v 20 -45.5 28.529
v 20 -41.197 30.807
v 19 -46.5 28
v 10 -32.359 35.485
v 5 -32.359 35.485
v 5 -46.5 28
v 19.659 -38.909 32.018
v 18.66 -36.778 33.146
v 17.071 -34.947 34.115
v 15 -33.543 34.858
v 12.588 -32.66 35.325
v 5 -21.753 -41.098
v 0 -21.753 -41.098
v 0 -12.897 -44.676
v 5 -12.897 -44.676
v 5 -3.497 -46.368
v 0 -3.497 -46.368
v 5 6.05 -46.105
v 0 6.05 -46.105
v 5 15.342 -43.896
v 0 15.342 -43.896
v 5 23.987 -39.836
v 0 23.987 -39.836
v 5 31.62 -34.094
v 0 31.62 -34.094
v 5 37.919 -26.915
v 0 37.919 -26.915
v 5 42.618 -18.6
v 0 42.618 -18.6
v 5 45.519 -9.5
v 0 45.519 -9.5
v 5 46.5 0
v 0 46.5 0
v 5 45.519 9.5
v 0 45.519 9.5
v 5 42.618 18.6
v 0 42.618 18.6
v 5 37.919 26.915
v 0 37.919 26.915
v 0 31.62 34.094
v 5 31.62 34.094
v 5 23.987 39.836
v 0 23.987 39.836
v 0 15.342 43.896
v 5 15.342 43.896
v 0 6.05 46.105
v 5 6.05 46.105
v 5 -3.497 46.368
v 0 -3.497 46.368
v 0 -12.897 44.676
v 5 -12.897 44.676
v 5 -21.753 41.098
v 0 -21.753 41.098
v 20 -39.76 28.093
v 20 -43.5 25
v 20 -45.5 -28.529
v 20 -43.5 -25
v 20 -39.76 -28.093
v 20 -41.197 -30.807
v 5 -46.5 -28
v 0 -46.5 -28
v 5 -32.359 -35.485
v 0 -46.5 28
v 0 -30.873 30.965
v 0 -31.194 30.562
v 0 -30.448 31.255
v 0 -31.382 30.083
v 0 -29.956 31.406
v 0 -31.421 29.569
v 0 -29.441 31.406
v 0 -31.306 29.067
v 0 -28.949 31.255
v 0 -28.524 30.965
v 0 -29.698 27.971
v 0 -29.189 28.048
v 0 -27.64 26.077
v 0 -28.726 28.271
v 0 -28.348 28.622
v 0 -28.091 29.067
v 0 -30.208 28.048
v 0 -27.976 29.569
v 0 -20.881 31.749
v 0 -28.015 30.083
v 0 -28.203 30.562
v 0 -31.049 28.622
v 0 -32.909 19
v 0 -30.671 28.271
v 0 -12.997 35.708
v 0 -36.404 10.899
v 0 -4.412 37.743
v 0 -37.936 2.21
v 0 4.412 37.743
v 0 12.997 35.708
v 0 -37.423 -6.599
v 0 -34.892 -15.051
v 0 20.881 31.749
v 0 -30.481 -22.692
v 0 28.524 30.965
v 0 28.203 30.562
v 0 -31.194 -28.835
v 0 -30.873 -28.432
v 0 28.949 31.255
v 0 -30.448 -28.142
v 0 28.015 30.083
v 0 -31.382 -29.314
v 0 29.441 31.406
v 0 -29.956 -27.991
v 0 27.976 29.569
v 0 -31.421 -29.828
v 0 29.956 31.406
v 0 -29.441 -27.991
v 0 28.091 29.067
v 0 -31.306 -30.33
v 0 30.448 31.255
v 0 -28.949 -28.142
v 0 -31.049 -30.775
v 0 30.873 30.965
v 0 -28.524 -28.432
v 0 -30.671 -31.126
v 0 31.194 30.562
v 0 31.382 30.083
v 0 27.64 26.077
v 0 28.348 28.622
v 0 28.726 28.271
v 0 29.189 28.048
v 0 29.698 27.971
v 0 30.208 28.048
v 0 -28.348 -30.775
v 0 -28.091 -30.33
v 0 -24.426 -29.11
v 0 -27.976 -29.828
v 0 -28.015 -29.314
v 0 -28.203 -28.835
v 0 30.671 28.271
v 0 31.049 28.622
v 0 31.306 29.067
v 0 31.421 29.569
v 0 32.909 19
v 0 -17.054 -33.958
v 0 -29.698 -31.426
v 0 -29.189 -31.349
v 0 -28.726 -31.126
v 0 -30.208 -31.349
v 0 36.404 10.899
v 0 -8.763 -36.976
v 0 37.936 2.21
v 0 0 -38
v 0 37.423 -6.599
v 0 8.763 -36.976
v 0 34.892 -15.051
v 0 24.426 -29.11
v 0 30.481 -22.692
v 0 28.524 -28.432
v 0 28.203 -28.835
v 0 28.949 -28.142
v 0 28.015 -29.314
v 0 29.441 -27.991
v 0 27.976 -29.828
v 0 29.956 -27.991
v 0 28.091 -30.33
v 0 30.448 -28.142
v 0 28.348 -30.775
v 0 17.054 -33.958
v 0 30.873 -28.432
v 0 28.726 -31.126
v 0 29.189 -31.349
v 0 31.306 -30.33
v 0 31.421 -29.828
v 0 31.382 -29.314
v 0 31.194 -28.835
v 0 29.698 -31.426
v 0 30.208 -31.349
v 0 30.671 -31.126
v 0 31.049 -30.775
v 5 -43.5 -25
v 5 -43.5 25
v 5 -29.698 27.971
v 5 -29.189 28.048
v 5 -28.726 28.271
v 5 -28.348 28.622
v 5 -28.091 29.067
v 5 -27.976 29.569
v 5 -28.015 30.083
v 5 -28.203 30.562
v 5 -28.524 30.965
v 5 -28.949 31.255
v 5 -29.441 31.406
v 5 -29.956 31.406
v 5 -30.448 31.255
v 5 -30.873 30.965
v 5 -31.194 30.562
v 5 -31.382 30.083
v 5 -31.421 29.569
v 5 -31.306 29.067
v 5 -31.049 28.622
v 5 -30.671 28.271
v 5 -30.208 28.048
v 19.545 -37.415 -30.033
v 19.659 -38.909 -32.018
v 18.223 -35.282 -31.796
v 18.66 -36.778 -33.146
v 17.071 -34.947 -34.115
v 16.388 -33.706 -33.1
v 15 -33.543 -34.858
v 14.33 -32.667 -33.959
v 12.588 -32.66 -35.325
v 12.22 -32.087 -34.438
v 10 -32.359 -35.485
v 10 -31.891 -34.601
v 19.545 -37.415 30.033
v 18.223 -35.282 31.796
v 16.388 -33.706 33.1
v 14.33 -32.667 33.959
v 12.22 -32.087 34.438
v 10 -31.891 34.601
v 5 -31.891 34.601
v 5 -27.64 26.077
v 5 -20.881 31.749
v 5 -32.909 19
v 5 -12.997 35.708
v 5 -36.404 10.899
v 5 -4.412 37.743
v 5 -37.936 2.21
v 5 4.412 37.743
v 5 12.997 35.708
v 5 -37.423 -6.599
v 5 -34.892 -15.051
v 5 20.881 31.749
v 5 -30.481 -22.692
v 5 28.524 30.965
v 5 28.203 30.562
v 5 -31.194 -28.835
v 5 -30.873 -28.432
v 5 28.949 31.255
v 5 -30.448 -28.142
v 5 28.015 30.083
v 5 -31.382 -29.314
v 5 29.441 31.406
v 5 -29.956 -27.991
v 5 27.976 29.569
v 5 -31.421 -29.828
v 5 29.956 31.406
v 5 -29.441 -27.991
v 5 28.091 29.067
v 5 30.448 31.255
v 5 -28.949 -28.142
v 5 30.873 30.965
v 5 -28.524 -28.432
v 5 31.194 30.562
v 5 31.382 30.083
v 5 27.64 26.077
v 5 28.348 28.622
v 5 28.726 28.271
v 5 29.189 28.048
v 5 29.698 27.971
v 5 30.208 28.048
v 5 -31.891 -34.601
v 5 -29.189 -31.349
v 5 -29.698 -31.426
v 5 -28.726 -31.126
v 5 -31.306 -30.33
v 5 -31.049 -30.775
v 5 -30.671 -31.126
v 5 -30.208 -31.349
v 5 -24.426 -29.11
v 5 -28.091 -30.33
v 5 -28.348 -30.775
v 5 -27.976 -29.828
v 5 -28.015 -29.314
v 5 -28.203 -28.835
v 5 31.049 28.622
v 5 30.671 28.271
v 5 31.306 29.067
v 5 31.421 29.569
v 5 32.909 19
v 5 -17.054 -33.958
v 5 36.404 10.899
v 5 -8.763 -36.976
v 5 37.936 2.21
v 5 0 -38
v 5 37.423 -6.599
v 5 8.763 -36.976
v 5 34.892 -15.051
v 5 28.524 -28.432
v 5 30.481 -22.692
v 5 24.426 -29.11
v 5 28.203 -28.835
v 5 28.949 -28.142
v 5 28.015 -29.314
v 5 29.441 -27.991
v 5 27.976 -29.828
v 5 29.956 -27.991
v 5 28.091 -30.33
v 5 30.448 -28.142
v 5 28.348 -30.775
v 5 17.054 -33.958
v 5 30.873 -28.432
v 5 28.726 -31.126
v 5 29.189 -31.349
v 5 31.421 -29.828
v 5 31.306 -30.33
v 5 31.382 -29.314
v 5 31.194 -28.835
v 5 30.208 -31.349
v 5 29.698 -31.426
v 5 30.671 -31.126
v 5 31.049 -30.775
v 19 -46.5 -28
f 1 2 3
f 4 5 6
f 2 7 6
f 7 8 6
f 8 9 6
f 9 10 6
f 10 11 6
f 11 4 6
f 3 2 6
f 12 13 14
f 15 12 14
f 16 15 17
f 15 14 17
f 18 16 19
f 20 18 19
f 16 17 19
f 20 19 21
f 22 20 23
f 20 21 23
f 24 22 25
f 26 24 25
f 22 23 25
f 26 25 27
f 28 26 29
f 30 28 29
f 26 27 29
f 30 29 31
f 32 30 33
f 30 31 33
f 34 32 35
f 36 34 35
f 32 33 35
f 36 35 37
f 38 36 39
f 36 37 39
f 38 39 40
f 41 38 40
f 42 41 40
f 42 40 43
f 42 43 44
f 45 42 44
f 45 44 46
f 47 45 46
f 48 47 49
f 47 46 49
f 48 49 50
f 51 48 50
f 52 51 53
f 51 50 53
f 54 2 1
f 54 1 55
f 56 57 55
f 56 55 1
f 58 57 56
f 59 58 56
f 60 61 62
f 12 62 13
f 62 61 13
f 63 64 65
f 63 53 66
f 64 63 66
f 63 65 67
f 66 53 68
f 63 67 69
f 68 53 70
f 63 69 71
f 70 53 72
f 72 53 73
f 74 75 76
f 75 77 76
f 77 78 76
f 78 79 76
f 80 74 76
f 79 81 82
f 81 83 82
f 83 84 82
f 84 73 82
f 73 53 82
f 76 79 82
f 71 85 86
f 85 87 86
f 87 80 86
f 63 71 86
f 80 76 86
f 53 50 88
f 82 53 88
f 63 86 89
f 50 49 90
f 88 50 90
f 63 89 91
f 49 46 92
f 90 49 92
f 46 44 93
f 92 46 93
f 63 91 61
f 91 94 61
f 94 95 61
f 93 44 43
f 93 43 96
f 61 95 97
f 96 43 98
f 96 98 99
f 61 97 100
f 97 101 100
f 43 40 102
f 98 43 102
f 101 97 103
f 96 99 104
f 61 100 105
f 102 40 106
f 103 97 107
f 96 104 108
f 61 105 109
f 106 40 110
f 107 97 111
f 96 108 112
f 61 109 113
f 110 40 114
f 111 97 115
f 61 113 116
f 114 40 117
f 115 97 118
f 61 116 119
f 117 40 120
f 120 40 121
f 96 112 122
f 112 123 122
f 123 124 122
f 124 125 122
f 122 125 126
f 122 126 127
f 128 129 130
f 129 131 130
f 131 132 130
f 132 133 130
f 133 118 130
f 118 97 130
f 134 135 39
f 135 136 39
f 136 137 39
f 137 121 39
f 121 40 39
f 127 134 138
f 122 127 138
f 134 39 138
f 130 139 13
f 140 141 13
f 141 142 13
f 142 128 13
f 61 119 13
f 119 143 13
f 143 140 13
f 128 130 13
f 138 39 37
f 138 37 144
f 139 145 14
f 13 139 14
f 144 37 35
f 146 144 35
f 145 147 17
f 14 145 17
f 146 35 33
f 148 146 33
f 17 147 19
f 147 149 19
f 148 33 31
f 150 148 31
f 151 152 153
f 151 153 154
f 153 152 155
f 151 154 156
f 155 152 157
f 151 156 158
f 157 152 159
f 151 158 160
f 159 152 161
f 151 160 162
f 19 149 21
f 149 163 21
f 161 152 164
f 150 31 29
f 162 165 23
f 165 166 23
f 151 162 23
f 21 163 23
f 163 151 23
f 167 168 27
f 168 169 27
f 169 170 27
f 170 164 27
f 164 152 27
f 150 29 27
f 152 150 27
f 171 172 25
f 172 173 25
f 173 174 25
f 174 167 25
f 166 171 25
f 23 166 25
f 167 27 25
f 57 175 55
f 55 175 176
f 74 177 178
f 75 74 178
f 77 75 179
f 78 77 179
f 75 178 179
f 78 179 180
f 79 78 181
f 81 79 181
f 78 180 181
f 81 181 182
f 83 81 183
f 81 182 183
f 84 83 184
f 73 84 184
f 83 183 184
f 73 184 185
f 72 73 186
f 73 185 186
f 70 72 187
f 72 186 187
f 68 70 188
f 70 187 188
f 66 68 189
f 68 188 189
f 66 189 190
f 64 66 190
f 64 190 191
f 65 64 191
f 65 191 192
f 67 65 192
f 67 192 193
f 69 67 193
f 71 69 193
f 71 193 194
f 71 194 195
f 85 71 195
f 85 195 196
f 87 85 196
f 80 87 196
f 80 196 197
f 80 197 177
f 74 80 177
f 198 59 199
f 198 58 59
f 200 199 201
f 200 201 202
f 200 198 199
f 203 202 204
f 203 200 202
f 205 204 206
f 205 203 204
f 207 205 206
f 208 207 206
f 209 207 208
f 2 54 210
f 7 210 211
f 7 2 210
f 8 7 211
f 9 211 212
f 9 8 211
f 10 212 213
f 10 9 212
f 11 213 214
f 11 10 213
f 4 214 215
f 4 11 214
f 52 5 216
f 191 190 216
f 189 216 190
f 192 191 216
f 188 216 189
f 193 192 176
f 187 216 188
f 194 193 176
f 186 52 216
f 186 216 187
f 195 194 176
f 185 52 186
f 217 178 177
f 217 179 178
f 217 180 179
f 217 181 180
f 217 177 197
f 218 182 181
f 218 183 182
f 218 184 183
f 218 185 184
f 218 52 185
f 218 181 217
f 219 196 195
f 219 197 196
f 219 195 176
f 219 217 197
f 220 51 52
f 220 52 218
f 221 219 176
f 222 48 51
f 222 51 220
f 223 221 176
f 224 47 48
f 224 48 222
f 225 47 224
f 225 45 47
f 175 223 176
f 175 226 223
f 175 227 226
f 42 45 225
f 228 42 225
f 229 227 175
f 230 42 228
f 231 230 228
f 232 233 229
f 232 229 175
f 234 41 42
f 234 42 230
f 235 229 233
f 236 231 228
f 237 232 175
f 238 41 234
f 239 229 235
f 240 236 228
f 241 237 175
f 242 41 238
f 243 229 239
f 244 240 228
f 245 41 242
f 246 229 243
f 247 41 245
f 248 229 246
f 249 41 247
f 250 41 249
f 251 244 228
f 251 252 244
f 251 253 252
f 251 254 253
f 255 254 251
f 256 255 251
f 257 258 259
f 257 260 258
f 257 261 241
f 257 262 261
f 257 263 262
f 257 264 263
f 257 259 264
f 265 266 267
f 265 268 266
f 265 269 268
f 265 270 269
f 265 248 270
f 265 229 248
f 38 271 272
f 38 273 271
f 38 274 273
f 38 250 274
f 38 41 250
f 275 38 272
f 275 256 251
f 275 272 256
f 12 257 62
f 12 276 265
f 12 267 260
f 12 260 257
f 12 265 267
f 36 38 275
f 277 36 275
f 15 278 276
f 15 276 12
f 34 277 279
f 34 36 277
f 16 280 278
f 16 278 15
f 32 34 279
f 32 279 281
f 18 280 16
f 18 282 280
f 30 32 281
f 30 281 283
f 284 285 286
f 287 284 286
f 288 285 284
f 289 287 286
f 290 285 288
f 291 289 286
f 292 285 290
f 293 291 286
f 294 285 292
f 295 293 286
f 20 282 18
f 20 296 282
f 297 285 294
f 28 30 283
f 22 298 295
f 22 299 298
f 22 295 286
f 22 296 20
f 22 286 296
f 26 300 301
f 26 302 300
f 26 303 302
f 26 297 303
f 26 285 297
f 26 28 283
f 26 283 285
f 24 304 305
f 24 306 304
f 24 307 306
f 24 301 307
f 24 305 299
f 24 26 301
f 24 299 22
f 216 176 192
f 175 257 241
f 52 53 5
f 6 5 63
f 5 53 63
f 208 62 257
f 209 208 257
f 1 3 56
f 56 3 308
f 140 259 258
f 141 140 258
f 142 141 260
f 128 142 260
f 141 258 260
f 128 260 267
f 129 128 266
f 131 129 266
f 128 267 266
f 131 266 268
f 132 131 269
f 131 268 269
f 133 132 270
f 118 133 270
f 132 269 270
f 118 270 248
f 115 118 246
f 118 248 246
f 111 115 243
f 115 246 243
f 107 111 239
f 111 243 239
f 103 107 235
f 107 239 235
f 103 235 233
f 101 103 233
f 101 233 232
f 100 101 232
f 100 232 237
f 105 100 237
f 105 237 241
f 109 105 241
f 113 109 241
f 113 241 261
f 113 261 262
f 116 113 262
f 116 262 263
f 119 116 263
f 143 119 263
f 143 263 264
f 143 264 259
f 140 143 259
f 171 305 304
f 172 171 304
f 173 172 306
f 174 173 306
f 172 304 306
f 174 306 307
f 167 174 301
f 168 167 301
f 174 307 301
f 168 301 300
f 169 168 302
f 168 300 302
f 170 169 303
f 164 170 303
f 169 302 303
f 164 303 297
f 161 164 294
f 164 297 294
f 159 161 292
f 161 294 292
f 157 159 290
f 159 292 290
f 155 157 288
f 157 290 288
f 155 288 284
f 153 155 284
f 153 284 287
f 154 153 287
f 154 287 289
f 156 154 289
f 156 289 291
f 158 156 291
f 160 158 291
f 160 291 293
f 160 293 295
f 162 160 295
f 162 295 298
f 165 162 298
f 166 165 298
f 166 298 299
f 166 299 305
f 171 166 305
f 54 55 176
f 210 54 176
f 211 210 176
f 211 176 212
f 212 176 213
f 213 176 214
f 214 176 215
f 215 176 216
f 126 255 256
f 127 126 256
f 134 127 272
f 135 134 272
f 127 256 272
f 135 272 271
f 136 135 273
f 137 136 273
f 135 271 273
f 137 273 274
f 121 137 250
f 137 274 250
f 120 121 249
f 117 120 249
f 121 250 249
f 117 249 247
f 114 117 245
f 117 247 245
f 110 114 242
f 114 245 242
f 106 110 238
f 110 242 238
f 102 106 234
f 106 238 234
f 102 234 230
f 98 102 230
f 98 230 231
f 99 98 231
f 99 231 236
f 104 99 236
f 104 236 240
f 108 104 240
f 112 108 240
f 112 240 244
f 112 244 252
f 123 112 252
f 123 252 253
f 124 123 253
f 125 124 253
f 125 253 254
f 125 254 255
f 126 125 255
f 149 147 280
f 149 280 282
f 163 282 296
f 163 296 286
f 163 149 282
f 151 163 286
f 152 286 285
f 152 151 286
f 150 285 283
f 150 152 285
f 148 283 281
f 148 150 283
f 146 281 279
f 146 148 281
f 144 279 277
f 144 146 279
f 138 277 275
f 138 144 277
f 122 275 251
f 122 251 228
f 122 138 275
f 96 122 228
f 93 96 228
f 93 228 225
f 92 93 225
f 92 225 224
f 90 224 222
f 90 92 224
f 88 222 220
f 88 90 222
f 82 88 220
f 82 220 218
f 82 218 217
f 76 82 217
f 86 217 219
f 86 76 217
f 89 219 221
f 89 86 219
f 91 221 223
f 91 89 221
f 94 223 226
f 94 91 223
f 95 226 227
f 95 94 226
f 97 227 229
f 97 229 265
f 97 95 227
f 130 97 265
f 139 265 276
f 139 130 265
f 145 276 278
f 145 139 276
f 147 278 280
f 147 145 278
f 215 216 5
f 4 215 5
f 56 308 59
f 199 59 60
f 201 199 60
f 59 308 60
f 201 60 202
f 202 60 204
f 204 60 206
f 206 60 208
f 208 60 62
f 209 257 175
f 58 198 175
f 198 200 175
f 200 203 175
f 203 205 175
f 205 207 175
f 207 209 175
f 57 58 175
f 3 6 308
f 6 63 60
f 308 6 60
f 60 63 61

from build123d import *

# Parameters (mm, degrees)
SKETCH1_R             = 38
BOSS_EXTRUDE1_DEPTH   = 5
BOSS_EXTRUDE2_DEPTH   = 15
F_4_CLEARANCE_HOLE1_D = 3.4544
FILLET1_R             = 10
CHAMFER1_SIZE         = 1


with BuildPart() as part:
    # Sketch1 → Boss-Extrude1 (new body)
    with BuildSketch(Plane(origin=(0, 0, 0), x_dir=(0, 0, -1), z_dir=(1, 0, 0))):
        with BuildLine():
            Line((-28, -46.5), (28, -46.5))
            Line((28, -46.5), (41.098345354, -21.752609249))
            ThreePointArc((41.098345354, -21.752609249), (0, 46.5), (-41.098345354, -21.752609249))
            Line((-41.098345354, -21.752609249), (-28, -46.5))
        make_face()
        Circle(SKETCH1_R, mode=Mode.SUBTRACT)
    extrude(amount=BOSS_EXTRUDE1_DEPTH)

    # Sketch2 → Boss-Extrude2 (add)
    with BuildSketch(Plane(origin=(5, 0, 0), x_dir=(0, 0, -1), z_dir=(1, 0, 0))):
        Polygon((-28, -46.5), (28, -46.5), (35.484768774, -32.358633857), (34.60093339, -31.890835808), (25, -43.5), (-25, -43.5), (-34.60093339, -31.890835808), (-35.484768774, -32.358633857), align=None)
    extrude(amount=BOSS_EXTRUDE2_DEPTH)

    # #4 Clearance Hole1 (through all)
    with Locations(Plane.ZY):
        with Locations((-29.69848481, -29.69848481), (-29.69848481, 29.69848481), (29.69848481, 29.69848481), (29.69848481, -29.69848481)):
            Hole(F_4_CLEARANCE_HOLE1_D / 2)

    # Fillet1
    fillet1_edges = [part.edges().sort_by_distance(p)[0] for p in [
        (20, -32.124734832, -35.042851082),
        (20, -32.124734832, 35.042851082),
    ]]
    fillet(fillet1_edges, radius=FILLET1_R)

    # Chamfer1
    chamfer1_edges = [part.edges().sort_by_distance(p)[0] for p in [
        (20, -46.5, 0),
    ]]
    chamfer(chamfer1_edges, length=CHAMFER1_SIZE)


solid = part.part
